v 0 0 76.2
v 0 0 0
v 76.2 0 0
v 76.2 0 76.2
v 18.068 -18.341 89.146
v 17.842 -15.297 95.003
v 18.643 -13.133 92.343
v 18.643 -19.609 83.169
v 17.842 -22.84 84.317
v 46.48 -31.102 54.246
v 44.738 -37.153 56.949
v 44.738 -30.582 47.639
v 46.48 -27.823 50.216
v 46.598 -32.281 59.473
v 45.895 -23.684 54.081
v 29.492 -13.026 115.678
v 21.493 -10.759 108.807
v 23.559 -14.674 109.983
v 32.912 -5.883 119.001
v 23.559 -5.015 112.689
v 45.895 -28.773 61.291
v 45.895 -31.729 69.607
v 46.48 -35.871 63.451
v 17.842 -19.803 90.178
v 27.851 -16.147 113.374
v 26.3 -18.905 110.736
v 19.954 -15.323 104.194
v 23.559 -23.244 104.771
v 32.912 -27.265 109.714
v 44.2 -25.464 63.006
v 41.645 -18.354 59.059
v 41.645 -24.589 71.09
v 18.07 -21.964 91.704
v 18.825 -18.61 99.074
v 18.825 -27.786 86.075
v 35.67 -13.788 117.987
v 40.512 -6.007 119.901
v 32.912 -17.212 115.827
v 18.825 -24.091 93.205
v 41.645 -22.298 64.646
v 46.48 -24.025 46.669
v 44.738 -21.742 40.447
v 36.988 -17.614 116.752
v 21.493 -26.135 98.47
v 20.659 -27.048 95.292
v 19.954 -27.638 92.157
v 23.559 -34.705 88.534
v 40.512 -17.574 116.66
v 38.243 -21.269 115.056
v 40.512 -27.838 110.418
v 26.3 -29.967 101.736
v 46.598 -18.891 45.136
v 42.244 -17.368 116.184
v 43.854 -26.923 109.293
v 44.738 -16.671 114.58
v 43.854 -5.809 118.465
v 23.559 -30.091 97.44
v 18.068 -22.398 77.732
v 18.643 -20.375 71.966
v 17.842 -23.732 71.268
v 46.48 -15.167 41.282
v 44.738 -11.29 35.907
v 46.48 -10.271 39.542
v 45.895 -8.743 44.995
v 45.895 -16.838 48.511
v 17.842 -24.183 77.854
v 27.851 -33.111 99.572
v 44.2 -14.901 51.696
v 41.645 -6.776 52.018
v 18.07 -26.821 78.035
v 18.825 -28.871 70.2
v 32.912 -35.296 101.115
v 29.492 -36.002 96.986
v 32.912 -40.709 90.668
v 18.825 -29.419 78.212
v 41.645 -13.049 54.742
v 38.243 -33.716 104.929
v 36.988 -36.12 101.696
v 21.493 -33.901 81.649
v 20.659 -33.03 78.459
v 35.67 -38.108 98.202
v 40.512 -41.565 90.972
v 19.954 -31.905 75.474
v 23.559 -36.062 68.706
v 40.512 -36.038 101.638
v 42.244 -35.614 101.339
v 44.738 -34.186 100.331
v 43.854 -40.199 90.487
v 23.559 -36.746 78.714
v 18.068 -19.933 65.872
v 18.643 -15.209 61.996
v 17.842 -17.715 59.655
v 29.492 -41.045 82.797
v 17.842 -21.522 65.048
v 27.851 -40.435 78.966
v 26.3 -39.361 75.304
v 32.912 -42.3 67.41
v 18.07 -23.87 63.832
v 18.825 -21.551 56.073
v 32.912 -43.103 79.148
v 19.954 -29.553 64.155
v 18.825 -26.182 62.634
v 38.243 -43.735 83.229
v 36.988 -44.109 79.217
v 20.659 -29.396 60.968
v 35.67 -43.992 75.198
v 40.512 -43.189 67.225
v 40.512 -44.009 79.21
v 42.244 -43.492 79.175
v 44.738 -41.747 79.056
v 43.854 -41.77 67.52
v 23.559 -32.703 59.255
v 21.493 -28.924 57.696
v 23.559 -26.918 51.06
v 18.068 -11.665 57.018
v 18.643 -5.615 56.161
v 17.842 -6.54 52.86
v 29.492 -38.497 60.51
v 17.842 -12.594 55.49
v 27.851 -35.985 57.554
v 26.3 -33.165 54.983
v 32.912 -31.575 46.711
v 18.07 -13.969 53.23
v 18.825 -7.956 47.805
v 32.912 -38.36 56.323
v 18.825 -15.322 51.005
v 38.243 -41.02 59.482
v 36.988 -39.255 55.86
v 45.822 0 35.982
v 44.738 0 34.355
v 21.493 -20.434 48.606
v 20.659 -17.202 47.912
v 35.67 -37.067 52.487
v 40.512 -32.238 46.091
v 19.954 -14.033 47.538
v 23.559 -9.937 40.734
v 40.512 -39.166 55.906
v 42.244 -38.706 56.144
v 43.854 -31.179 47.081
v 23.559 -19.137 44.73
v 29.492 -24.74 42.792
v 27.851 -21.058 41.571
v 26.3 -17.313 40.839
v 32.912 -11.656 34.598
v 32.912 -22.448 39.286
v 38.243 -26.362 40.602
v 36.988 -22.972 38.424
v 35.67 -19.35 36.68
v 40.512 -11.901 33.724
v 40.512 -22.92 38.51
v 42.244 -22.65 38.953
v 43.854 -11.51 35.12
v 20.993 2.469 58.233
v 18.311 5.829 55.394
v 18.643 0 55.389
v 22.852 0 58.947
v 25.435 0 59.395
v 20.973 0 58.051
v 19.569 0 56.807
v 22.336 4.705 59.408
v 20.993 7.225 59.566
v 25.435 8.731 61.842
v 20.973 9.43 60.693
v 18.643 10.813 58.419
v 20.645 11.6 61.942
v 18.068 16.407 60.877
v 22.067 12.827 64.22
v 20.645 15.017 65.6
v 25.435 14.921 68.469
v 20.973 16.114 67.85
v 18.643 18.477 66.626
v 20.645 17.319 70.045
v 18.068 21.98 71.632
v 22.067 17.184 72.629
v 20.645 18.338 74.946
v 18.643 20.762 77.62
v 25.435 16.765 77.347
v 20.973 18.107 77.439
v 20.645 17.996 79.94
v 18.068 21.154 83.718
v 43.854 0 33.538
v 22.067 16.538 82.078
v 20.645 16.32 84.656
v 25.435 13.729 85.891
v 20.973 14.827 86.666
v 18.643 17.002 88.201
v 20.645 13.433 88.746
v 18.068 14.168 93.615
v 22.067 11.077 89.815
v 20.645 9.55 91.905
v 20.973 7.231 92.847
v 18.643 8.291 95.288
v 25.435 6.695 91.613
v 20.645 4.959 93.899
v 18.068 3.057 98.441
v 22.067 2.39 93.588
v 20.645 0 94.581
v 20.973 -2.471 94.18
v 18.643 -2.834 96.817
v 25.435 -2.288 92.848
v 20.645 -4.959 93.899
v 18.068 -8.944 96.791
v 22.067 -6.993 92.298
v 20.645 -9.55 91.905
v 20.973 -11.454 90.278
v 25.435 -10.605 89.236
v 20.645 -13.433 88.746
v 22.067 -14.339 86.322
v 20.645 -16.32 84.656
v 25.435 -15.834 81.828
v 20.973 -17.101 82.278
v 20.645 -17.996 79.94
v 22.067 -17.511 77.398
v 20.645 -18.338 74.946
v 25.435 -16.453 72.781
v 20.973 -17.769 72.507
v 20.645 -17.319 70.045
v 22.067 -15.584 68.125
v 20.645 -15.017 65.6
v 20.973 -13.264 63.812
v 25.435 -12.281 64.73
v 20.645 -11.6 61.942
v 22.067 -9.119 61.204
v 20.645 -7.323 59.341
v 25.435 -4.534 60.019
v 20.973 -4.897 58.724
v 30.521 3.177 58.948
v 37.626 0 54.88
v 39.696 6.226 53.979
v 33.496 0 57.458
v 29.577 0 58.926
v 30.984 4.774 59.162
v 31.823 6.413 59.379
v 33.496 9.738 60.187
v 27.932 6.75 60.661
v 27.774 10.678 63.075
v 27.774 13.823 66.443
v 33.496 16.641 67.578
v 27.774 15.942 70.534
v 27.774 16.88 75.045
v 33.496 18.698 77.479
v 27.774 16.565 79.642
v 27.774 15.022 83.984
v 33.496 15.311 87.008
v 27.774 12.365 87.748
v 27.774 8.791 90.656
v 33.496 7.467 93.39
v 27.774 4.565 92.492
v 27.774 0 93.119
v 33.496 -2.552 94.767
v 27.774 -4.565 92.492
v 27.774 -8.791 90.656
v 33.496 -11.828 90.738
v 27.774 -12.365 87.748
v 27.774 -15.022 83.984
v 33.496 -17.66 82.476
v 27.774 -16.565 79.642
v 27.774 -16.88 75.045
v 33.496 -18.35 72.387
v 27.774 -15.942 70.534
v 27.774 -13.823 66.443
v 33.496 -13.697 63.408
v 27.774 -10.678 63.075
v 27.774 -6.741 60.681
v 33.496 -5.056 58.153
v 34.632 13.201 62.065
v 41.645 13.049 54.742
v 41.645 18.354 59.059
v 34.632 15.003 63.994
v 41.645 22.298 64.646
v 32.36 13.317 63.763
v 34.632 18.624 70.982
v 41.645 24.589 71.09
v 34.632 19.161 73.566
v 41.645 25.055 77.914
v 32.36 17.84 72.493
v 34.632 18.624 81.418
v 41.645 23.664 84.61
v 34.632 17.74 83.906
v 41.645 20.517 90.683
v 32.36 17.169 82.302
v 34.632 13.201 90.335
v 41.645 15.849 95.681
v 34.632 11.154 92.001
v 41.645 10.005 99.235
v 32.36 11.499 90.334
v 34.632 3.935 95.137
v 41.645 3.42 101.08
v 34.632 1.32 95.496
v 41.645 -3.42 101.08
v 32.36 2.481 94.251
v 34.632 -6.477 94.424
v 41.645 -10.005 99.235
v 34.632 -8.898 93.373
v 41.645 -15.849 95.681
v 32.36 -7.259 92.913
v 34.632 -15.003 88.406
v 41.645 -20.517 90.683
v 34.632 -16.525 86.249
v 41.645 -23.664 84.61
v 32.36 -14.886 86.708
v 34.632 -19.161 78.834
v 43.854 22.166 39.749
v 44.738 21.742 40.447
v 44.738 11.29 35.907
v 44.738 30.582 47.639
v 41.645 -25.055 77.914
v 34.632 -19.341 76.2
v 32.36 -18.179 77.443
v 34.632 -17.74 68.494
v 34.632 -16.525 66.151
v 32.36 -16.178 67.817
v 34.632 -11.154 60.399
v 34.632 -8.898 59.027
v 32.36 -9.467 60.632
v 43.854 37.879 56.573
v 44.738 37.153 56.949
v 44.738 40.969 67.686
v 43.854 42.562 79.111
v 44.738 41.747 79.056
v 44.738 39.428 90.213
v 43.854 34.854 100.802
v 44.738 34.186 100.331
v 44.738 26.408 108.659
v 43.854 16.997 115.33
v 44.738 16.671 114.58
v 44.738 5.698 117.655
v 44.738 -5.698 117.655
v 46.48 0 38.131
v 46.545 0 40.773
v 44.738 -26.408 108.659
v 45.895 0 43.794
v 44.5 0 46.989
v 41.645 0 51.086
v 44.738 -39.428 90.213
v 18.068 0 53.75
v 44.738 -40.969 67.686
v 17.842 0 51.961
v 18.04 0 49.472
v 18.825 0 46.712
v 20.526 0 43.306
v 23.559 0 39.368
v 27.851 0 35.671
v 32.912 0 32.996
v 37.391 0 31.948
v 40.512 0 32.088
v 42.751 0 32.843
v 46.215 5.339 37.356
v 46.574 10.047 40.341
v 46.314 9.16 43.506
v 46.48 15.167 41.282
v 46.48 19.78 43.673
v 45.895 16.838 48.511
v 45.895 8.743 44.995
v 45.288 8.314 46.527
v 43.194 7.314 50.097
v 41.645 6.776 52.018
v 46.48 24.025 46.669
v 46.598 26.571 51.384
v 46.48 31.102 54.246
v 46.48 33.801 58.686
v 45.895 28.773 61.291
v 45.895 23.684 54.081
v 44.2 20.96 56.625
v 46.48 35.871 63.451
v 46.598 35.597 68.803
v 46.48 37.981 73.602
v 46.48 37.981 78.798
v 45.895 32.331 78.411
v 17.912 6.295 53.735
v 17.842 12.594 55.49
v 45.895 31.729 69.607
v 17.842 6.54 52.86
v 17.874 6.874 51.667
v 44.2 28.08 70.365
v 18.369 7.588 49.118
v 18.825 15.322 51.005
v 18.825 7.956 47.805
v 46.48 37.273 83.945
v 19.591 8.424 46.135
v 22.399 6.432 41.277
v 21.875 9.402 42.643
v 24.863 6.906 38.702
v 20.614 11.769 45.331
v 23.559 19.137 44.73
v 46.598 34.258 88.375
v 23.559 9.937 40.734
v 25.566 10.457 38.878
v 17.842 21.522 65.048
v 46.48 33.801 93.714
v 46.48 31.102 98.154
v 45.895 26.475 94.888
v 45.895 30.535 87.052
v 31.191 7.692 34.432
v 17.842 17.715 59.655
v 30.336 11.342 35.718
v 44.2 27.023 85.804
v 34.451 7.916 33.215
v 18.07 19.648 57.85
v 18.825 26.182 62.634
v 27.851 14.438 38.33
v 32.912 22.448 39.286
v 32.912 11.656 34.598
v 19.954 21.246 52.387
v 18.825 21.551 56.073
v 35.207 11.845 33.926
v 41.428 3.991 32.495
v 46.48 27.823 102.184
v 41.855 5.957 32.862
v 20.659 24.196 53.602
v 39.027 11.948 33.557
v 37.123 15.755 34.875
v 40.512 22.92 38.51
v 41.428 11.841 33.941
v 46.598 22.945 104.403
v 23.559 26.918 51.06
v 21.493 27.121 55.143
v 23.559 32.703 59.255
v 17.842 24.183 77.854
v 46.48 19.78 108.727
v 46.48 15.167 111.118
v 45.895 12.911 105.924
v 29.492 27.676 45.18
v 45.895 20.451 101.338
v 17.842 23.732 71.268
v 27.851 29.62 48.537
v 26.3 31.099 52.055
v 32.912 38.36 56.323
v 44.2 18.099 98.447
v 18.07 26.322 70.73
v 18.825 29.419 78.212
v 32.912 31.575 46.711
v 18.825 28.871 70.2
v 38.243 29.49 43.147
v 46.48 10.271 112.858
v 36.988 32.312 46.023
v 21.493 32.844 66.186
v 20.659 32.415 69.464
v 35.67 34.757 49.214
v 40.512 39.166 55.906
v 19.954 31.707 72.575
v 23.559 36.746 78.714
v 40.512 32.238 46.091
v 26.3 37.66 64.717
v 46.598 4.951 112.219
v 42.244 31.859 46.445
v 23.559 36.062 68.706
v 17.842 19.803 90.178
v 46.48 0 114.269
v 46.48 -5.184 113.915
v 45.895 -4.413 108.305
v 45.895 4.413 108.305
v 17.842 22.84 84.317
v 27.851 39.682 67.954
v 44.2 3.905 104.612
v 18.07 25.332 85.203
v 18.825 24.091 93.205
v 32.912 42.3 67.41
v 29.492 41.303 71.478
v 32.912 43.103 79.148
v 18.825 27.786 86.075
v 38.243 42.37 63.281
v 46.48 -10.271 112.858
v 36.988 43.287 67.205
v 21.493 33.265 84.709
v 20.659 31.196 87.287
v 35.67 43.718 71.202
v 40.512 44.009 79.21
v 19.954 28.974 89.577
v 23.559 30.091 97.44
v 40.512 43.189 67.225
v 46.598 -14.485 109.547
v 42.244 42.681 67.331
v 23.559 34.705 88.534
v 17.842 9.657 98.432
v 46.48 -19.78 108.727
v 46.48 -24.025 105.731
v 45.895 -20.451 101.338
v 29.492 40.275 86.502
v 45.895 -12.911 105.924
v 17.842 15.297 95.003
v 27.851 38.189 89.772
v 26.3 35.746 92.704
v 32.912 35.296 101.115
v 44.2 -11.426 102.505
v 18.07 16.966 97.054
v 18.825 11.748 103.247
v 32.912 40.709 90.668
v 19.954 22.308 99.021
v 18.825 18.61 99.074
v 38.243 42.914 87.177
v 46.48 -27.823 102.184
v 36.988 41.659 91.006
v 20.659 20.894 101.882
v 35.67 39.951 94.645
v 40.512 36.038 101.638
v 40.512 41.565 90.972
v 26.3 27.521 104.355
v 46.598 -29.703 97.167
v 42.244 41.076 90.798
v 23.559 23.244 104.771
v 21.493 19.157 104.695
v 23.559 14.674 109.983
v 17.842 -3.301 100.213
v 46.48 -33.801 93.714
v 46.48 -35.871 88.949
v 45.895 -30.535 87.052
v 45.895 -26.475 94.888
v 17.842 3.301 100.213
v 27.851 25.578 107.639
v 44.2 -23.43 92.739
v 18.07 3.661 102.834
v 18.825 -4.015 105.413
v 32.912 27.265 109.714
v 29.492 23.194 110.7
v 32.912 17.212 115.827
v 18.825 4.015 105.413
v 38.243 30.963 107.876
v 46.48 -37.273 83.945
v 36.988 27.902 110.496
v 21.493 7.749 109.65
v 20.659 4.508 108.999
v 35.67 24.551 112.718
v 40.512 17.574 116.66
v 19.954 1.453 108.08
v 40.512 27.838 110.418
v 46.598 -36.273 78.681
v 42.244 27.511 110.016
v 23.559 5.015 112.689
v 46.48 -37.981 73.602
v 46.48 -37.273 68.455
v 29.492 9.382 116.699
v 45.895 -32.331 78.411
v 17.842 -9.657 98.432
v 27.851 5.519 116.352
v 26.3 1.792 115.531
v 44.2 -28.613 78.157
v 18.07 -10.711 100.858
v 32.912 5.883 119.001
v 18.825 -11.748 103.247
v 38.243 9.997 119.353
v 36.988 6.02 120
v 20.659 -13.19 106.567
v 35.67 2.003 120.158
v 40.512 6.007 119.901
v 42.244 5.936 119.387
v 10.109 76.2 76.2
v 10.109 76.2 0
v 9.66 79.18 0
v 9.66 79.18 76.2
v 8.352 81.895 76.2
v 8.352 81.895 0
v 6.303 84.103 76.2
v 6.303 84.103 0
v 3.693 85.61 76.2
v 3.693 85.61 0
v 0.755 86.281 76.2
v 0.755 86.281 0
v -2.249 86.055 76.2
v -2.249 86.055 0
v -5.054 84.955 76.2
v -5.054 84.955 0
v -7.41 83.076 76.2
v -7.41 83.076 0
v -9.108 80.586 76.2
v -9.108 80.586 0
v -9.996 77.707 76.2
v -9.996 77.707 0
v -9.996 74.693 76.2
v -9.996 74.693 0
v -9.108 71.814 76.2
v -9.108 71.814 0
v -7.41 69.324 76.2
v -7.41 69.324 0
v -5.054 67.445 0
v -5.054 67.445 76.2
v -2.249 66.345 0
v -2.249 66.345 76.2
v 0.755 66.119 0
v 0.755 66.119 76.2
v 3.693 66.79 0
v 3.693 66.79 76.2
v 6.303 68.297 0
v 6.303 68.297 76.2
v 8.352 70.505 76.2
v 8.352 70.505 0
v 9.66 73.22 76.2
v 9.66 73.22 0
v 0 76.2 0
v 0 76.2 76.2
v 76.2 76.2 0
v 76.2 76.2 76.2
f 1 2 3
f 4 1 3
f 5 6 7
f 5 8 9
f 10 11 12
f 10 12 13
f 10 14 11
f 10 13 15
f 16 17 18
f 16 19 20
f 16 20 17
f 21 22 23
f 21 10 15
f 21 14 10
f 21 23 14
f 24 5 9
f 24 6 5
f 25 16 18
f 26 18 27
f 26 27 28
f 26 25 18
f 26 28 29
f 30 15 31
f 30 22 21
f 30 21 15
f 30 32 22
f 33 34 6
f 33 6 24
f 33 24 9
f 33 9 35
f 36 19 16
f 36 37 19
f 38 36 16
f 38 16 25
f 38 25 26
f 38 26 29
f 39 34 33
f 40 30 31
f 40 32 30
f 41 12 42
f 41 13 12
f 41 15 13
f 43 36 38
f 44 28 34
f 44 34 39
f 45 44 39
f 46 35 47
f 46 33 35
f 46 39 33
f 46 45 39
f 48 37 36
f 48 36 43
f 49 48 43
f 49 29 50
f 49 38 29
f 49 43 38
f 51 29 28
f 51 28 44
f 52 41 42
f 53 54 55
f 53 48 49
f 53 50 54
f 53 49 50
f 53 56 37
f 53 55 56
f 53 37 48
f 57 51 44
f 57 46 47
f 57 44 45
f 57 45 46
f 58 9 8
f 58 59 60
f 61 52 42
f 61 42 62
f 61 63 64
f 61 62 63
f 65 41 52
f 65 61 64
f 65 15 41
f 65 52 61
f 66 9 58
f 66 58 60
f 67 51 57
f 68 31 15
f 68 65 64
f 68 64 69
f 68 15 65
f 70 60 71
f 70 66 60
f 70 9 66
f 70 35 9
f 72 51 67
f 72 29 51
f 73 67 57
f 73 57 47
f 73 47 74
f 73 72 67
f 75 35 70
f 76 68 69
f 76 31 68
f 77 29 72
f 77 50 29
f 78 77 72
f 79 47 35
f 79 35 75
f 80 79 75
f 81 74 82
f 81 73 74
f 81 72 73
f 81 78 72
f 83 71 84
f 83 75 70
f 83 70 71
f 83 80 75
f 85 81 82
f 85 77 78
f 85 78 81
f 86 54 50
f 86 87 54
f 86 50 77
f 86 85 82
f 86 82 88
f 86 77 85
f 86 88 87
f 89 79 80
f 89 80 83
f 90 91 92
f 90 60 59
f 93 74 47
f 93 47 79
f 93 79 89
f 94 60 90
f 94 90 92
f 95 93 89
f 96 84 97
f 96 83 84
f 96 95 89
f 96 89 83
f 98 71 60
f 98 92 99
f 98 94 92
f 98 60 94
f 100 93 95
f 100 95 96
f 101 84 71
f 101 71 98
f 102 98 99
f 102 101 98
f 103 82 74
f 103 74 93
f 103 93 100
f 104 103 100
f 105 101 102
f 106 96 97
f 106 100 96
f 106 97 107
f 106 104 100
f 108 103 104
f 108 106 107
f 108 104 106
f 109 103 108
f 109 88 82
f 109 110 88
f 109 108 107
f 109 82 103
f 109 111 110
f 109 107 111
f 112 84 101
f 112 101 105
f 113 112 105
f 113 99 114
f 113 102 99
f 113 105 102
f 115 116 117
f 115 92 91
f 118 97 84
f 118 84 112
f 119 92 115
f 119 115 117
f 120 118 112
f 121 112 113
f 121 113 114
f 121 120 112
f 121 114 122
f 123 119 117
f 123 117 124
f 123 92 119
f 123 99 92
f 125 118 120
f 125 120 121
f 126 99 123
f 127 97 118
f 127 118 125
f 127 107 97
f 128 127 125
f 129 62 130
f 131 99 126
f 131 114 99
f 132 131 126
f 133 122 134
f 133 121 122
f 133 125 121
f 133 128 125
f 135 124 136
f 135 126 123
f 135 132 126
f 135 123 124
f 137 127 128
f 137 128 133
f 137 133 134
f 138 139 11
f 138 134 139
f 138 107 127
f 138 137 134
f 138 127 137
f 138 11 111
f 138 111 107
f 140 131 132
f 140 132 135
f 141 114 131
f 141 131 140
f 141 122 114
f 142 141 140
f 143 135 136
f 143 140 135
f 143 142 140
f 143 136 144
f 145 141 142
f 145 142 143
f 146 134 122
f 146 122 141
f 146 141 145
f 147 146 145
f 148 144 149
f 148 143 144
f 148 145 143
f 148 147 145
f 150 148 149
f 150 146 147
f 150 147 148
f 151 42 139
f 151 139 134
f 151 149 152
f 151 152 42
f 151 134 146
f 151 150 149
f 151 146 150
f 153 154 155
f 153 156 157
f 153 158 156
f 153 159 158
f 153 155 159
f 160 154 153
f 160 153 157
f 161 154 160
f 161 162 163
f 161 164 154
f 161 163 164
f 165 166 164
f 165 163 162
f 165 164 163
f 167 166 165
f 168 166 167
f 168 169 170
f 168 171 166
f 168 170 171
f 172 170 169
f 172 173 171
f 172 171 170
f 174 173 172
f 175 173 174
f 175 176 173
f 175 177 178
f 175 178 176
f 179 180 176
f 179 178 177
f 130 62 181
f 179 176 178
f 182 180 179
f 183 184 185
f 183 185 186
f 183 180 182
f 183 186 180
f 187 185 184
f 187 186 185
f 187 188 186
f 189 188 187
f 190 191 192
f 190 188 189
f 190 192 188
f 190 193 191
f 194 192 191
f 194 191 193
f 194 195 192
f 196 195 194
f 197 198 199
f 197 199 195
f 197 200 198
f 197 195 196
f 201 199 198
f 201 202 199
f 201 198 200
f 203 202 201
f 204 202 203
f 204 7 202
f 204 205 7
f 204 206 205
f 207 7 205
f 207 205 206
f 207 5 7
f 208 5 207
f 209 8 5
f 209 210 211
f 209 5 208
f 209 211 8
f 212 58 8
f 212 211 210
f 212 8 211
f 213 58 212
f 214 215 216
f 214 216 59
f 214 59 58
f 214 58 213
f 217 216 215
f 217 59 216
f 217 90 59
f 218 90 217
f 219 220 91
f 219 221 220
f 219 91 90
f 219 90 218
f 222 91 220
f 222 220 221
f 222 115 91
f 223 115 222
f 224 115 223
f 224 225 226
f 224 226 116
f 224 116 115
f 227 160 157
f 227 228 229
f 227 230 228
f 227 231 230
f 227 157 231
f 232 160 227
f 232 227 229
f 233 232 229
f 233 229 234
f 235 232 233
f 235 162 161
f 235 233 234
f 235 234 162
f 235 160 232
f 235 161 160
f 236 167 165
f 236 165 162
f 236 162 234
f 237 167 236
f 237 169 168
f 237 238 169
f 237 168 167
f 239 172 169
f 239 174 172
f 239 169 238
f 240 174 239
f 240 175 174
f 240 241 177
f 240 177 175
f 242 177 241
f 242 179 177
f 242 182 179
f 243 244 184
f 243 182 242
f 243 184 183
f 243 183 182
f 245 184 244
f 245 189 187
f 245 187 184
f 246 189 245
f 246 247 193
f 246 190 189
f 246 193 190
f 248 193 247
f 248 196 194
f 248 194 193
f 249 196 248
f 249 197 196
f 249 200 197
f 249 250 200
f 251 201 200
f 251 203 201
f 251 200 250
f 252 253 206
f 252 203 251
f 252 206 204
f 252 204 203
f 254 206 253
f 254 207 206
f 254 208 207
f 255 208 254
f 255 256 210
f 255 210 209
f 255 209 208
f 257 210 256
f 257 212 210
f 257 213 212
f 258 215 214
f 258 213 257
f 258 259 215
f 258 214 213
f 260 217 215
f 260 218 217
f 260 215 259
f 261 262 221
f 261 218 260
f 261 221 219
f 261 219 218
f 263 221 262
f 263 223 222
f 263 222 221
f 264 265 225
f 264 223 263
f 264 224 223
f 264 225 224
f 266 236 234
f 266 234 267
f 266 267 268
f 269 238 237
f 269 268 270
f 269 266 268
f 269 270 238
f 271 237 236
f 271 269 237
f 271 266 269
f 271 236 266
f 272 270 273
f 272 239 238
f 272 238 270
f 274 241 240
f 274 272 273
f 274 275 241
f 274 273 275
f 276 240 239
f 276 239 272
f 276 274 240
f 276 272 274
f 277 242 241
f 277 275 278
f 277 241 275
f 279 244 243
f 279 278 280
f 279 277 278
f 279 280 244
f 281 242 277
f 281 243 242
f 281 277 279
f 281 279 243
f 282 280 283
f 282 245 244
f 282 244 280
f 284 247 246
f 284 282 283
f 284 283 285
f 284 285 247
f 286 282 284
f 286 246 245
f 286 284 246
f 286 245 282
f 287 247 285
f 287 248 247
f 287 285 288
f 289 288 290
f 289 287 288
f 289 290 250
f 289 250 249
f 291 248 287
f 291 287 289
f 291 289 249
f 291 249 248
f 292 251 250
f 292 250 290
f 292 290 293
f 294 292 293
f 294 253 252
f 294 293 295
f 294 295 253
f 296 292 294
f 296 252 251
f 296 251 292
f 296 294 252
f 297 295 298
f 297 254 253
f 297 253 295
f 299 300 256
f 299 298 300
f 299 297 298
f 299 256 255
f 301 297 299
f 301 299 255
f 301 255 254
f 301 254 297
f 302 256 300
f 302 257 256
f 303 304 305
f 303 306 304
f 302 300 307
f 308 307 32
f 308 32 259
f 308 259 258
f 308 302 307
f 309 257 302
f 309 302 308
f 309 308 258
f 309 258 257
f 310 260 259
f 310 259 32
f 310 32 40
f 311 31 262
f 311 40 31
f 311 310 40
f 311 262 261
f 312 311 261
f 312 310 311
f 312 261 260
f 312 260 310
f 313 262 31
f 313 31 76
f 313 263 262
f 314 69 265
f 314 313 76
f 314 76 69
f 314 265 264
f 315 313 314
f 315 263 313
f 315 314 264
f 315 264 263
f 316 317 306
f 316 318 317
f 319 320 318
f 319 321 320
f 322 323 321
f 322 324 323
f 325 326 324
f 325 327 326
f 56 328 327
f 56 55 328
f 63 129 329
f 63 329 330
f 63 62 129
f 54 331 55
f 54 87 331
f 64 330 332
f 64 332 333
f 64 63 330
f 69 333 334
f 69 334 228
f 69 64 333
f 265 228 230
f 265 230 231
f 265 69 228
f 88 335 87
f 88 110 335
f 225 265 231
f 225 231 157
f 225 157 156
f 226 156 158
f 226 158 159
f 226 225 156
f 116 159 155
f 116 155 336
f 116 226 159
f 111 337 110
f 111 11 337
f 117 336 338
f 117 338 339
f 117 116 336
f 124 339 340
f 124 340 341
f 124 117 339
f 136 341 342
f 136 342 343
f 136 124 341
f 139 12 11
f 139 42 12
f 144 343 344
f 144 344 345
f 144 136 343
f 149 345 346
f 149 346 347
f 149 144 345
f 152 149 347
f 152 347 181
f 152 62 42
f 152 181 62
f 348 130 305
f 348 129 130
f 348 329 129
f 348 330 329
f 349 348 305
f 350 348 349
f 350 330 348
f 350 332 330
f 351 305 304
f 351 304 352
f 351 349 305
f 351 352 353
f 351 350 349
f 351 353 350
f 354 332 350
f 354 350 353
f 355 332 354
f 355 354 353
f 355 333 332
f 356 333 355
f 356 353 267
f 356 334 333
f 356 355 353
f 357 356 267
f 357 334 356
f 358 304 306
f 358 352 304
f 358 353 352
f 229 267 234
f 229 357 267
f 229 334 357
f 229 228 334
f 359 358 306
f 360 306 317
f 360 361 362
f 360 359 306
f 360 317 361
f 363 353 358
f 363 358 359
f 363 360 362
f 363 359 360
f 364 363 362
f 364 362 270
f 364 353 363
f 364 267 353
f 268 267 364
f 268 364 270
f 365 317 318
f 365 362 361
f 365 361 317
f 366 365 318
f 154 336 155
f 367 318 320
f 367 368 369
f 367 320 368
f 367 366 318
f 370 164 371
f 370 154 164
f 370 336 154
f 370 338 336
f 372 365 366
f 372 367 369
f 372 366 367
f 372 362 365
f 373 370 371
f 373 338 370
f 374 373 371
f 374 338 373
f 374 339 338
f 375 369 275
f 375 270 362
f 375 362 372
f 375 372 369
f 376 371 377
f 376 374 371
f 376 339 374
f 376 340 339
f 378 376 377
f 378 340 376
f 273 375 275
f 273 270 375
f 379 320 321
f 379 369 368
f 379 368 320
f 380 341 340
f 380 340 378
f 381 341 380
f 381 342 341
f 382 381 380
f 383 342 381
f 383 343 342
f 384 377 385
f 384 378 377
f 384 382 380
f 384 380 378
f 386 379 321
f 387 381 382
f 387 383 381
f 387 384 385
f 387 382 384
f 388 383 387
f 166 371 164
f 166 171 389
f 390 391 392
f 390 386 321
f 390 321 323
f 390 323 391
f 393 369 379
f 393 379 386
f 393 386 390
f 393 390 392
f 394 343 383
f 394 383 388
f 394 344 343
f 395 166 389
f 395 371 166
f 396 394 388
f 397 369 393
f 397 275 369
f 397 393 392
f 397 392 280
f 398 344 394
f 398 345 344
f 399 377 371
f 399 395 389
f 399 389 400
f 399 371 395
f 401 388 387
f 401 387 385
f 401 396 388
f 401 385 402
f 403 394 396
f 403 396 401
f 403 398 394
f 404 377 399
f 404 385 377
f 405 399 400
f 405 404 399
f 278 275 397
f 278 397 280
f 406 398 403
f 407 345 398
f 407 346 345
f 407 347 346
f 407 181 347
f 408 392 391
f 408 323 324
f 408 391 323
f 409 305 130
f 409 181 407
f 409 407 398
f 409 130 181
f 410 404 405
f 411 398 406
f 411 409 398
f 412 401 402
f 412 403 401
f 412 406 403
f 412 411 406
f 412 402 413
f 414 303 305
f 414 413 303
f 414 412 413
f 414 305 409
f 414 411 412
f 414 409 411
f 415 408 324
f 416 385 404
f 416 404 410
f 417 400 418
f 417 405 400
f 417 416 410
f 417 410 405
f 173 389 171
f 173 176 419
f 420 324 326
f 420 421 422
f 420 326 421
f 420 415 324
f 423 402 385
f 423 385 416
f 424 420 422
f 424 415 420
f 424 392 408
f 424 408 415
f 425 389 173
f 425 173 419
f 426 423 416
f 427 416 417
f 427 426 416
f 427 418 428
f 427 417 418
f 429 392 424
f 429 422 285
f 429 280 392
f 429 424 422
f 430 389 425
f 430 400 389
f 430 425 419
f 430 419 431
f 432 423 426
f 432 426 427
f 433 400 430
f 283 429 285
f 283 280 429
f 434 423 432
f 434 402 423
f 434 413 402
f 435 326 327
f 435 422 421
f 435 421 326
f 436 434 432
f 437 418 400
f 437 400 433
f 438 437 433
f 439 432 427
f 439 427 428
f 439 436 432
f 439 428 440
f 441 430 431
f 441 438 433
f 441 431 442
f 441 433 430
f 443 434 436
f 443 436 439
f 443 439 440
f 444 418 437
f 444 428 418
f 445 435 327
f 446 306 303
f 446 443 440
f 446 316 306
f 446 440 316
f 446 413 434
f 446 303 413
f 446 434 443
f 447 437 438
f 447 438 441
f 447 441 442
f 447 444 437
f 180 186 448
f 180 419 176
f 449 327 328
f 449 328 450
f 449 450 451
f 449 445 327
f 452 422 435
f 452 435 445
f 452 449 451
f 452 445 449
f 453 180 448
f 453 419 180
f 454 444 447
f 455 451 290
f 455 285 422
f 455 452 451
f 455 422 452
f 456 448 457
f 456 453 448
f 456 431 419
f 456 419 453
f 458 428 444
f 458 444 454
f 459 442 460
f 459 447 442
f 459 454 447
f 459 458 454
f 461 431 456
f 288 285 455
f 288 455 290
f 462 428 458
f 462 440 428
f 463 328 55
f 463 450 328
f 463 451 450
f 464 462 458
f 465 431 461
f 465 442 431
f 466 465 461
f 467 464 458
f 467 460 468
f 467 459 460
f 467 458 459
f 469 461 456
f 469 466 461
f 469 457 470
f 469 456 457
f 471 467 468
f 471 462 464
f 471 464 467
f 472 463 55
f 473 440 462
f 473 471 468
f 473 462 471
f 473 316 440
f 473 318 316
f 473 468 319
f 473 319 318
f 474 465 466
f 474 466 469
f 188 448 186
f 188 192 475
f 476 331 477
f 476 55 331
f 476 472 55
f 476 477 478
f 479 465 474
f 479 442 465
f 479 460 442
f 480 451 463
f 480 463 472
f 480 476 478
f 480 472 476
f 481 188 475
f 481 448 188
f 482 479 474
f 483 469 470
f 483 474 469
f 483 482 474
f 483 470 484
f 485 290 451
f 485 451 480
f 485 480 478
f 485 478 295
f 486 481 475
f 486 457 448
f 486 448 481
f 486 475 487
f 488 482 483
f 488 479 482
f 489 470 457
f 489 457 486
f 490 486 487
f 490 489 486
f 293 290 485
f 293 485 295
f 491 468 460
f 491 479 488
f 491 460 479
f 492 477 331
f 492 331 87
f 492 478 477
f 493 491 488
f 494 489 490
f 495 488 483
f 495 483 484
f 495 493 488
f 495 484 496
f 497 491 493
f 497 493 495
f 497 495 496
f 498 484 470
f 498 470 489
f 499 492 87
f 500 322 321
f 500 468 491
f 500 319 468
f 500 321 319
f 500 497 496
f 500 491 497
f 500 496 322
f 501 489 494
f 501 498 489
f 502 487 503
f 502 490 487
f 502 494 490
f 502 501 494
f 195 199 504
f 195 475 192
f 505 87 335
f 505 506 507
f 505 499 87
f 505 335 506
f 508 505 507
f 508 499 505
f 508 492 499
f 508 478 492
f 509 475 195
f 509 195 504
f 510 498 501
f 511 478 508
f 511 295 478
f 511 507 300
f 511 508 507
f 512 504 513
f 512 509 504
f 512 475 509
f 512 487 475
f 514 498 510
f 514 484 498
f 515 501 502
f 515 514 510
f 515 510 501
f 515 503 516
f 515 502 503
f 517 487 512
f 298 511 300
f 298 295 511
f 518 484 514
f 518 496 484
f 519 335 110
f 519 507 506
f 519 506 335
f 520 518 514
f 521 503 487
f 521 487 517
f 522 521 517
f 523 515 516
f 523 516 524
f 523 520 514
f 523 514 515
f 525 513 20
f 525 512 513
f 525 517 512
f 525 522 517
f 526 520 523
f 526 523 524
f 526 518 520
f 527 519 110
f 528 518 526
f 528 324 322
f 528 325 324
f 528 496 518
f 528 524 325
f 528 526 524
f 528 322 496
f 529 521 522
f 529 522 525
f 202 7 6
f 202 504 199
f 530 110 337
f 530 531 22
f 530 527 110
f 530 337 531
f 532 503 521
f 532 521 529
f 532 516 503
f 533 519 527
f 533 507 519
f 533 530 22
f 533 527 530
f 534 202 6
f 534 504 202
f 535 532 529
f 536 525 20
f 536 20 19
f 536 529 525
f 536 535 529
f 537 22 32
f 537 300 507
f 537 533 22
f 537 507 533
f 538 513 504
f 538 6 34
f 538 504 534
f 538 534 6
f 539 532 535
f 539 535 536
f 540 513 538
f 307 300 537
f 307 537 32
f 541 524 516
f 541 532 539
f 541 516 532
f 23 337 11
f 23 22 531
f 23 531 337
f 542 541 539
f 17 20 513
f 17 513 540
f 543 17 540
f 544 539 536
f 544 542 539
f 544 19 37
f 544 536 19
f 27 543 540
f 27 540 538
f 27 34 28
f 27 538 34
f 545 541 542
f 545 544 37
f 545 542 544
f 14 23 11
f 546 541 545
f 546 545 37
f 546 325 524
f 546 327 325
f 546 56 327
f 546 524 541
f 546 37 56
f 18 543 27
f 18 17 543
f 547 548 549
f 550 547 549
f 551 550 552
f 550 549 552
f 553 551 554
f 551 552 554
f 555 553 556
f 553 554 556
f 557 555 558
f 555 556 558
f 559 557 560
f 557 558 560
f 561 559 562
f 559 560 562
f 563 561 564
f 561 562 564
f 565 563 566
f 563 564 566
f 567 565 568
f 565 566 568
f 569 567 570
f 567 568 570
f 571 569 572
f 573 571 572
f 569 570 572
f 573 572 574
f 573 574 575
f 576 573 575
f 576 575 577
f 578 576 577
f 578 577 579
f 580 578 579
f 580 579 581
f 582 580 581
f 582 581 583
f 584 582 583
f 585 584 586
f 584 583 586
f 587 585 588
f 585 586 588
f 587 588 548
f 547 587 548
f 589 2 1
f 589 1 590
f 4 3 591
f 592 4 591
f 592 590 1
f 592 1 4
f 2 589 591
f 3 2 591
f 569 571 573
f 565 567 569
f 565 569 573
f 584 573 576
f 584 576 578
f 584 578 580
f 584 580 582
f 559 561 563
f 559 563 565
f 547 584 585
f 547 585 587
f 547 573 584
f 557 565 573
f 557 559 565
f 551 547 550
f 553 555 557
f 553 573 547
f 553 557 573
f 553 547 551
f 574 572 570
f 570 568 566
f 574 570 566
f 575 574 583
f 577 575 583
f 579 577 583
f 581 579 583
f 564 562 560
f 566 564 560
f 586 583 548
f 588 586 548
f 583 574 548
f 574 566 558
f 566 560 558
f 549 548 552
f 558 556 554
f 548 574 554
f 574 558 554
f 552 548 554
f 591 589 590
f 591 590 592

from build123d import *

# Parameters (mm, degrees)
F0_W     = 76.2
F0_H     = 76.2
F1_DEPTH = 76.2
F4_R     = 10.1088473741
F5_DEPTH = 76.2


with BuildPart() as f1:
    # F0 (on Top) → F1 (new body)
    with BuildSketch(Plane.XY):
        with Locations((38.1, 38.1)):
            Rectangle(F0_W, F0_H)
    extrude(amount=F1_DEPTH)


with BuildPart() as f3:
    # F2 (on Front) → F3 (revolve)
    with BuildSketch(Plane.XZ):
        with BuildLine():
            add(Edge.make_bspline(
                [(44.7384156287, 34.3554392457), (56.9925669918, 47.9343674417), (32.0845129137, 58.0935865311), (7.1764588356, 68.2528056204), (19.8303615506, 44.5146583351), (32.4842642656, 20.7765110497), (44.7384156287, 34.3554392457)],
                knots=[0, 0, 0, 2.0943951024, 2.0943951024, 4.1887902048, 4.1887902048, 6.2831853072, 6.2831853072, 6.2831853072], degree=2, weights=[1, 0.5, 1, 0.5, 1, 0.5, 1]))
        make_face()
    revolve(axis=Axis((38.1, 0, 76.2), (1, 0, 0)))


with BuildPart() as f5:
    # F4 (on Top) → F5 (new body, through all)
    with BuildSketch(Plane.XY):
        with Locations((0, 76.2)):
            Circle(F4_R)
    extrude(amount=F5_DEPTH)


solid = Compound([f1.part, f3.part, f5.part])
